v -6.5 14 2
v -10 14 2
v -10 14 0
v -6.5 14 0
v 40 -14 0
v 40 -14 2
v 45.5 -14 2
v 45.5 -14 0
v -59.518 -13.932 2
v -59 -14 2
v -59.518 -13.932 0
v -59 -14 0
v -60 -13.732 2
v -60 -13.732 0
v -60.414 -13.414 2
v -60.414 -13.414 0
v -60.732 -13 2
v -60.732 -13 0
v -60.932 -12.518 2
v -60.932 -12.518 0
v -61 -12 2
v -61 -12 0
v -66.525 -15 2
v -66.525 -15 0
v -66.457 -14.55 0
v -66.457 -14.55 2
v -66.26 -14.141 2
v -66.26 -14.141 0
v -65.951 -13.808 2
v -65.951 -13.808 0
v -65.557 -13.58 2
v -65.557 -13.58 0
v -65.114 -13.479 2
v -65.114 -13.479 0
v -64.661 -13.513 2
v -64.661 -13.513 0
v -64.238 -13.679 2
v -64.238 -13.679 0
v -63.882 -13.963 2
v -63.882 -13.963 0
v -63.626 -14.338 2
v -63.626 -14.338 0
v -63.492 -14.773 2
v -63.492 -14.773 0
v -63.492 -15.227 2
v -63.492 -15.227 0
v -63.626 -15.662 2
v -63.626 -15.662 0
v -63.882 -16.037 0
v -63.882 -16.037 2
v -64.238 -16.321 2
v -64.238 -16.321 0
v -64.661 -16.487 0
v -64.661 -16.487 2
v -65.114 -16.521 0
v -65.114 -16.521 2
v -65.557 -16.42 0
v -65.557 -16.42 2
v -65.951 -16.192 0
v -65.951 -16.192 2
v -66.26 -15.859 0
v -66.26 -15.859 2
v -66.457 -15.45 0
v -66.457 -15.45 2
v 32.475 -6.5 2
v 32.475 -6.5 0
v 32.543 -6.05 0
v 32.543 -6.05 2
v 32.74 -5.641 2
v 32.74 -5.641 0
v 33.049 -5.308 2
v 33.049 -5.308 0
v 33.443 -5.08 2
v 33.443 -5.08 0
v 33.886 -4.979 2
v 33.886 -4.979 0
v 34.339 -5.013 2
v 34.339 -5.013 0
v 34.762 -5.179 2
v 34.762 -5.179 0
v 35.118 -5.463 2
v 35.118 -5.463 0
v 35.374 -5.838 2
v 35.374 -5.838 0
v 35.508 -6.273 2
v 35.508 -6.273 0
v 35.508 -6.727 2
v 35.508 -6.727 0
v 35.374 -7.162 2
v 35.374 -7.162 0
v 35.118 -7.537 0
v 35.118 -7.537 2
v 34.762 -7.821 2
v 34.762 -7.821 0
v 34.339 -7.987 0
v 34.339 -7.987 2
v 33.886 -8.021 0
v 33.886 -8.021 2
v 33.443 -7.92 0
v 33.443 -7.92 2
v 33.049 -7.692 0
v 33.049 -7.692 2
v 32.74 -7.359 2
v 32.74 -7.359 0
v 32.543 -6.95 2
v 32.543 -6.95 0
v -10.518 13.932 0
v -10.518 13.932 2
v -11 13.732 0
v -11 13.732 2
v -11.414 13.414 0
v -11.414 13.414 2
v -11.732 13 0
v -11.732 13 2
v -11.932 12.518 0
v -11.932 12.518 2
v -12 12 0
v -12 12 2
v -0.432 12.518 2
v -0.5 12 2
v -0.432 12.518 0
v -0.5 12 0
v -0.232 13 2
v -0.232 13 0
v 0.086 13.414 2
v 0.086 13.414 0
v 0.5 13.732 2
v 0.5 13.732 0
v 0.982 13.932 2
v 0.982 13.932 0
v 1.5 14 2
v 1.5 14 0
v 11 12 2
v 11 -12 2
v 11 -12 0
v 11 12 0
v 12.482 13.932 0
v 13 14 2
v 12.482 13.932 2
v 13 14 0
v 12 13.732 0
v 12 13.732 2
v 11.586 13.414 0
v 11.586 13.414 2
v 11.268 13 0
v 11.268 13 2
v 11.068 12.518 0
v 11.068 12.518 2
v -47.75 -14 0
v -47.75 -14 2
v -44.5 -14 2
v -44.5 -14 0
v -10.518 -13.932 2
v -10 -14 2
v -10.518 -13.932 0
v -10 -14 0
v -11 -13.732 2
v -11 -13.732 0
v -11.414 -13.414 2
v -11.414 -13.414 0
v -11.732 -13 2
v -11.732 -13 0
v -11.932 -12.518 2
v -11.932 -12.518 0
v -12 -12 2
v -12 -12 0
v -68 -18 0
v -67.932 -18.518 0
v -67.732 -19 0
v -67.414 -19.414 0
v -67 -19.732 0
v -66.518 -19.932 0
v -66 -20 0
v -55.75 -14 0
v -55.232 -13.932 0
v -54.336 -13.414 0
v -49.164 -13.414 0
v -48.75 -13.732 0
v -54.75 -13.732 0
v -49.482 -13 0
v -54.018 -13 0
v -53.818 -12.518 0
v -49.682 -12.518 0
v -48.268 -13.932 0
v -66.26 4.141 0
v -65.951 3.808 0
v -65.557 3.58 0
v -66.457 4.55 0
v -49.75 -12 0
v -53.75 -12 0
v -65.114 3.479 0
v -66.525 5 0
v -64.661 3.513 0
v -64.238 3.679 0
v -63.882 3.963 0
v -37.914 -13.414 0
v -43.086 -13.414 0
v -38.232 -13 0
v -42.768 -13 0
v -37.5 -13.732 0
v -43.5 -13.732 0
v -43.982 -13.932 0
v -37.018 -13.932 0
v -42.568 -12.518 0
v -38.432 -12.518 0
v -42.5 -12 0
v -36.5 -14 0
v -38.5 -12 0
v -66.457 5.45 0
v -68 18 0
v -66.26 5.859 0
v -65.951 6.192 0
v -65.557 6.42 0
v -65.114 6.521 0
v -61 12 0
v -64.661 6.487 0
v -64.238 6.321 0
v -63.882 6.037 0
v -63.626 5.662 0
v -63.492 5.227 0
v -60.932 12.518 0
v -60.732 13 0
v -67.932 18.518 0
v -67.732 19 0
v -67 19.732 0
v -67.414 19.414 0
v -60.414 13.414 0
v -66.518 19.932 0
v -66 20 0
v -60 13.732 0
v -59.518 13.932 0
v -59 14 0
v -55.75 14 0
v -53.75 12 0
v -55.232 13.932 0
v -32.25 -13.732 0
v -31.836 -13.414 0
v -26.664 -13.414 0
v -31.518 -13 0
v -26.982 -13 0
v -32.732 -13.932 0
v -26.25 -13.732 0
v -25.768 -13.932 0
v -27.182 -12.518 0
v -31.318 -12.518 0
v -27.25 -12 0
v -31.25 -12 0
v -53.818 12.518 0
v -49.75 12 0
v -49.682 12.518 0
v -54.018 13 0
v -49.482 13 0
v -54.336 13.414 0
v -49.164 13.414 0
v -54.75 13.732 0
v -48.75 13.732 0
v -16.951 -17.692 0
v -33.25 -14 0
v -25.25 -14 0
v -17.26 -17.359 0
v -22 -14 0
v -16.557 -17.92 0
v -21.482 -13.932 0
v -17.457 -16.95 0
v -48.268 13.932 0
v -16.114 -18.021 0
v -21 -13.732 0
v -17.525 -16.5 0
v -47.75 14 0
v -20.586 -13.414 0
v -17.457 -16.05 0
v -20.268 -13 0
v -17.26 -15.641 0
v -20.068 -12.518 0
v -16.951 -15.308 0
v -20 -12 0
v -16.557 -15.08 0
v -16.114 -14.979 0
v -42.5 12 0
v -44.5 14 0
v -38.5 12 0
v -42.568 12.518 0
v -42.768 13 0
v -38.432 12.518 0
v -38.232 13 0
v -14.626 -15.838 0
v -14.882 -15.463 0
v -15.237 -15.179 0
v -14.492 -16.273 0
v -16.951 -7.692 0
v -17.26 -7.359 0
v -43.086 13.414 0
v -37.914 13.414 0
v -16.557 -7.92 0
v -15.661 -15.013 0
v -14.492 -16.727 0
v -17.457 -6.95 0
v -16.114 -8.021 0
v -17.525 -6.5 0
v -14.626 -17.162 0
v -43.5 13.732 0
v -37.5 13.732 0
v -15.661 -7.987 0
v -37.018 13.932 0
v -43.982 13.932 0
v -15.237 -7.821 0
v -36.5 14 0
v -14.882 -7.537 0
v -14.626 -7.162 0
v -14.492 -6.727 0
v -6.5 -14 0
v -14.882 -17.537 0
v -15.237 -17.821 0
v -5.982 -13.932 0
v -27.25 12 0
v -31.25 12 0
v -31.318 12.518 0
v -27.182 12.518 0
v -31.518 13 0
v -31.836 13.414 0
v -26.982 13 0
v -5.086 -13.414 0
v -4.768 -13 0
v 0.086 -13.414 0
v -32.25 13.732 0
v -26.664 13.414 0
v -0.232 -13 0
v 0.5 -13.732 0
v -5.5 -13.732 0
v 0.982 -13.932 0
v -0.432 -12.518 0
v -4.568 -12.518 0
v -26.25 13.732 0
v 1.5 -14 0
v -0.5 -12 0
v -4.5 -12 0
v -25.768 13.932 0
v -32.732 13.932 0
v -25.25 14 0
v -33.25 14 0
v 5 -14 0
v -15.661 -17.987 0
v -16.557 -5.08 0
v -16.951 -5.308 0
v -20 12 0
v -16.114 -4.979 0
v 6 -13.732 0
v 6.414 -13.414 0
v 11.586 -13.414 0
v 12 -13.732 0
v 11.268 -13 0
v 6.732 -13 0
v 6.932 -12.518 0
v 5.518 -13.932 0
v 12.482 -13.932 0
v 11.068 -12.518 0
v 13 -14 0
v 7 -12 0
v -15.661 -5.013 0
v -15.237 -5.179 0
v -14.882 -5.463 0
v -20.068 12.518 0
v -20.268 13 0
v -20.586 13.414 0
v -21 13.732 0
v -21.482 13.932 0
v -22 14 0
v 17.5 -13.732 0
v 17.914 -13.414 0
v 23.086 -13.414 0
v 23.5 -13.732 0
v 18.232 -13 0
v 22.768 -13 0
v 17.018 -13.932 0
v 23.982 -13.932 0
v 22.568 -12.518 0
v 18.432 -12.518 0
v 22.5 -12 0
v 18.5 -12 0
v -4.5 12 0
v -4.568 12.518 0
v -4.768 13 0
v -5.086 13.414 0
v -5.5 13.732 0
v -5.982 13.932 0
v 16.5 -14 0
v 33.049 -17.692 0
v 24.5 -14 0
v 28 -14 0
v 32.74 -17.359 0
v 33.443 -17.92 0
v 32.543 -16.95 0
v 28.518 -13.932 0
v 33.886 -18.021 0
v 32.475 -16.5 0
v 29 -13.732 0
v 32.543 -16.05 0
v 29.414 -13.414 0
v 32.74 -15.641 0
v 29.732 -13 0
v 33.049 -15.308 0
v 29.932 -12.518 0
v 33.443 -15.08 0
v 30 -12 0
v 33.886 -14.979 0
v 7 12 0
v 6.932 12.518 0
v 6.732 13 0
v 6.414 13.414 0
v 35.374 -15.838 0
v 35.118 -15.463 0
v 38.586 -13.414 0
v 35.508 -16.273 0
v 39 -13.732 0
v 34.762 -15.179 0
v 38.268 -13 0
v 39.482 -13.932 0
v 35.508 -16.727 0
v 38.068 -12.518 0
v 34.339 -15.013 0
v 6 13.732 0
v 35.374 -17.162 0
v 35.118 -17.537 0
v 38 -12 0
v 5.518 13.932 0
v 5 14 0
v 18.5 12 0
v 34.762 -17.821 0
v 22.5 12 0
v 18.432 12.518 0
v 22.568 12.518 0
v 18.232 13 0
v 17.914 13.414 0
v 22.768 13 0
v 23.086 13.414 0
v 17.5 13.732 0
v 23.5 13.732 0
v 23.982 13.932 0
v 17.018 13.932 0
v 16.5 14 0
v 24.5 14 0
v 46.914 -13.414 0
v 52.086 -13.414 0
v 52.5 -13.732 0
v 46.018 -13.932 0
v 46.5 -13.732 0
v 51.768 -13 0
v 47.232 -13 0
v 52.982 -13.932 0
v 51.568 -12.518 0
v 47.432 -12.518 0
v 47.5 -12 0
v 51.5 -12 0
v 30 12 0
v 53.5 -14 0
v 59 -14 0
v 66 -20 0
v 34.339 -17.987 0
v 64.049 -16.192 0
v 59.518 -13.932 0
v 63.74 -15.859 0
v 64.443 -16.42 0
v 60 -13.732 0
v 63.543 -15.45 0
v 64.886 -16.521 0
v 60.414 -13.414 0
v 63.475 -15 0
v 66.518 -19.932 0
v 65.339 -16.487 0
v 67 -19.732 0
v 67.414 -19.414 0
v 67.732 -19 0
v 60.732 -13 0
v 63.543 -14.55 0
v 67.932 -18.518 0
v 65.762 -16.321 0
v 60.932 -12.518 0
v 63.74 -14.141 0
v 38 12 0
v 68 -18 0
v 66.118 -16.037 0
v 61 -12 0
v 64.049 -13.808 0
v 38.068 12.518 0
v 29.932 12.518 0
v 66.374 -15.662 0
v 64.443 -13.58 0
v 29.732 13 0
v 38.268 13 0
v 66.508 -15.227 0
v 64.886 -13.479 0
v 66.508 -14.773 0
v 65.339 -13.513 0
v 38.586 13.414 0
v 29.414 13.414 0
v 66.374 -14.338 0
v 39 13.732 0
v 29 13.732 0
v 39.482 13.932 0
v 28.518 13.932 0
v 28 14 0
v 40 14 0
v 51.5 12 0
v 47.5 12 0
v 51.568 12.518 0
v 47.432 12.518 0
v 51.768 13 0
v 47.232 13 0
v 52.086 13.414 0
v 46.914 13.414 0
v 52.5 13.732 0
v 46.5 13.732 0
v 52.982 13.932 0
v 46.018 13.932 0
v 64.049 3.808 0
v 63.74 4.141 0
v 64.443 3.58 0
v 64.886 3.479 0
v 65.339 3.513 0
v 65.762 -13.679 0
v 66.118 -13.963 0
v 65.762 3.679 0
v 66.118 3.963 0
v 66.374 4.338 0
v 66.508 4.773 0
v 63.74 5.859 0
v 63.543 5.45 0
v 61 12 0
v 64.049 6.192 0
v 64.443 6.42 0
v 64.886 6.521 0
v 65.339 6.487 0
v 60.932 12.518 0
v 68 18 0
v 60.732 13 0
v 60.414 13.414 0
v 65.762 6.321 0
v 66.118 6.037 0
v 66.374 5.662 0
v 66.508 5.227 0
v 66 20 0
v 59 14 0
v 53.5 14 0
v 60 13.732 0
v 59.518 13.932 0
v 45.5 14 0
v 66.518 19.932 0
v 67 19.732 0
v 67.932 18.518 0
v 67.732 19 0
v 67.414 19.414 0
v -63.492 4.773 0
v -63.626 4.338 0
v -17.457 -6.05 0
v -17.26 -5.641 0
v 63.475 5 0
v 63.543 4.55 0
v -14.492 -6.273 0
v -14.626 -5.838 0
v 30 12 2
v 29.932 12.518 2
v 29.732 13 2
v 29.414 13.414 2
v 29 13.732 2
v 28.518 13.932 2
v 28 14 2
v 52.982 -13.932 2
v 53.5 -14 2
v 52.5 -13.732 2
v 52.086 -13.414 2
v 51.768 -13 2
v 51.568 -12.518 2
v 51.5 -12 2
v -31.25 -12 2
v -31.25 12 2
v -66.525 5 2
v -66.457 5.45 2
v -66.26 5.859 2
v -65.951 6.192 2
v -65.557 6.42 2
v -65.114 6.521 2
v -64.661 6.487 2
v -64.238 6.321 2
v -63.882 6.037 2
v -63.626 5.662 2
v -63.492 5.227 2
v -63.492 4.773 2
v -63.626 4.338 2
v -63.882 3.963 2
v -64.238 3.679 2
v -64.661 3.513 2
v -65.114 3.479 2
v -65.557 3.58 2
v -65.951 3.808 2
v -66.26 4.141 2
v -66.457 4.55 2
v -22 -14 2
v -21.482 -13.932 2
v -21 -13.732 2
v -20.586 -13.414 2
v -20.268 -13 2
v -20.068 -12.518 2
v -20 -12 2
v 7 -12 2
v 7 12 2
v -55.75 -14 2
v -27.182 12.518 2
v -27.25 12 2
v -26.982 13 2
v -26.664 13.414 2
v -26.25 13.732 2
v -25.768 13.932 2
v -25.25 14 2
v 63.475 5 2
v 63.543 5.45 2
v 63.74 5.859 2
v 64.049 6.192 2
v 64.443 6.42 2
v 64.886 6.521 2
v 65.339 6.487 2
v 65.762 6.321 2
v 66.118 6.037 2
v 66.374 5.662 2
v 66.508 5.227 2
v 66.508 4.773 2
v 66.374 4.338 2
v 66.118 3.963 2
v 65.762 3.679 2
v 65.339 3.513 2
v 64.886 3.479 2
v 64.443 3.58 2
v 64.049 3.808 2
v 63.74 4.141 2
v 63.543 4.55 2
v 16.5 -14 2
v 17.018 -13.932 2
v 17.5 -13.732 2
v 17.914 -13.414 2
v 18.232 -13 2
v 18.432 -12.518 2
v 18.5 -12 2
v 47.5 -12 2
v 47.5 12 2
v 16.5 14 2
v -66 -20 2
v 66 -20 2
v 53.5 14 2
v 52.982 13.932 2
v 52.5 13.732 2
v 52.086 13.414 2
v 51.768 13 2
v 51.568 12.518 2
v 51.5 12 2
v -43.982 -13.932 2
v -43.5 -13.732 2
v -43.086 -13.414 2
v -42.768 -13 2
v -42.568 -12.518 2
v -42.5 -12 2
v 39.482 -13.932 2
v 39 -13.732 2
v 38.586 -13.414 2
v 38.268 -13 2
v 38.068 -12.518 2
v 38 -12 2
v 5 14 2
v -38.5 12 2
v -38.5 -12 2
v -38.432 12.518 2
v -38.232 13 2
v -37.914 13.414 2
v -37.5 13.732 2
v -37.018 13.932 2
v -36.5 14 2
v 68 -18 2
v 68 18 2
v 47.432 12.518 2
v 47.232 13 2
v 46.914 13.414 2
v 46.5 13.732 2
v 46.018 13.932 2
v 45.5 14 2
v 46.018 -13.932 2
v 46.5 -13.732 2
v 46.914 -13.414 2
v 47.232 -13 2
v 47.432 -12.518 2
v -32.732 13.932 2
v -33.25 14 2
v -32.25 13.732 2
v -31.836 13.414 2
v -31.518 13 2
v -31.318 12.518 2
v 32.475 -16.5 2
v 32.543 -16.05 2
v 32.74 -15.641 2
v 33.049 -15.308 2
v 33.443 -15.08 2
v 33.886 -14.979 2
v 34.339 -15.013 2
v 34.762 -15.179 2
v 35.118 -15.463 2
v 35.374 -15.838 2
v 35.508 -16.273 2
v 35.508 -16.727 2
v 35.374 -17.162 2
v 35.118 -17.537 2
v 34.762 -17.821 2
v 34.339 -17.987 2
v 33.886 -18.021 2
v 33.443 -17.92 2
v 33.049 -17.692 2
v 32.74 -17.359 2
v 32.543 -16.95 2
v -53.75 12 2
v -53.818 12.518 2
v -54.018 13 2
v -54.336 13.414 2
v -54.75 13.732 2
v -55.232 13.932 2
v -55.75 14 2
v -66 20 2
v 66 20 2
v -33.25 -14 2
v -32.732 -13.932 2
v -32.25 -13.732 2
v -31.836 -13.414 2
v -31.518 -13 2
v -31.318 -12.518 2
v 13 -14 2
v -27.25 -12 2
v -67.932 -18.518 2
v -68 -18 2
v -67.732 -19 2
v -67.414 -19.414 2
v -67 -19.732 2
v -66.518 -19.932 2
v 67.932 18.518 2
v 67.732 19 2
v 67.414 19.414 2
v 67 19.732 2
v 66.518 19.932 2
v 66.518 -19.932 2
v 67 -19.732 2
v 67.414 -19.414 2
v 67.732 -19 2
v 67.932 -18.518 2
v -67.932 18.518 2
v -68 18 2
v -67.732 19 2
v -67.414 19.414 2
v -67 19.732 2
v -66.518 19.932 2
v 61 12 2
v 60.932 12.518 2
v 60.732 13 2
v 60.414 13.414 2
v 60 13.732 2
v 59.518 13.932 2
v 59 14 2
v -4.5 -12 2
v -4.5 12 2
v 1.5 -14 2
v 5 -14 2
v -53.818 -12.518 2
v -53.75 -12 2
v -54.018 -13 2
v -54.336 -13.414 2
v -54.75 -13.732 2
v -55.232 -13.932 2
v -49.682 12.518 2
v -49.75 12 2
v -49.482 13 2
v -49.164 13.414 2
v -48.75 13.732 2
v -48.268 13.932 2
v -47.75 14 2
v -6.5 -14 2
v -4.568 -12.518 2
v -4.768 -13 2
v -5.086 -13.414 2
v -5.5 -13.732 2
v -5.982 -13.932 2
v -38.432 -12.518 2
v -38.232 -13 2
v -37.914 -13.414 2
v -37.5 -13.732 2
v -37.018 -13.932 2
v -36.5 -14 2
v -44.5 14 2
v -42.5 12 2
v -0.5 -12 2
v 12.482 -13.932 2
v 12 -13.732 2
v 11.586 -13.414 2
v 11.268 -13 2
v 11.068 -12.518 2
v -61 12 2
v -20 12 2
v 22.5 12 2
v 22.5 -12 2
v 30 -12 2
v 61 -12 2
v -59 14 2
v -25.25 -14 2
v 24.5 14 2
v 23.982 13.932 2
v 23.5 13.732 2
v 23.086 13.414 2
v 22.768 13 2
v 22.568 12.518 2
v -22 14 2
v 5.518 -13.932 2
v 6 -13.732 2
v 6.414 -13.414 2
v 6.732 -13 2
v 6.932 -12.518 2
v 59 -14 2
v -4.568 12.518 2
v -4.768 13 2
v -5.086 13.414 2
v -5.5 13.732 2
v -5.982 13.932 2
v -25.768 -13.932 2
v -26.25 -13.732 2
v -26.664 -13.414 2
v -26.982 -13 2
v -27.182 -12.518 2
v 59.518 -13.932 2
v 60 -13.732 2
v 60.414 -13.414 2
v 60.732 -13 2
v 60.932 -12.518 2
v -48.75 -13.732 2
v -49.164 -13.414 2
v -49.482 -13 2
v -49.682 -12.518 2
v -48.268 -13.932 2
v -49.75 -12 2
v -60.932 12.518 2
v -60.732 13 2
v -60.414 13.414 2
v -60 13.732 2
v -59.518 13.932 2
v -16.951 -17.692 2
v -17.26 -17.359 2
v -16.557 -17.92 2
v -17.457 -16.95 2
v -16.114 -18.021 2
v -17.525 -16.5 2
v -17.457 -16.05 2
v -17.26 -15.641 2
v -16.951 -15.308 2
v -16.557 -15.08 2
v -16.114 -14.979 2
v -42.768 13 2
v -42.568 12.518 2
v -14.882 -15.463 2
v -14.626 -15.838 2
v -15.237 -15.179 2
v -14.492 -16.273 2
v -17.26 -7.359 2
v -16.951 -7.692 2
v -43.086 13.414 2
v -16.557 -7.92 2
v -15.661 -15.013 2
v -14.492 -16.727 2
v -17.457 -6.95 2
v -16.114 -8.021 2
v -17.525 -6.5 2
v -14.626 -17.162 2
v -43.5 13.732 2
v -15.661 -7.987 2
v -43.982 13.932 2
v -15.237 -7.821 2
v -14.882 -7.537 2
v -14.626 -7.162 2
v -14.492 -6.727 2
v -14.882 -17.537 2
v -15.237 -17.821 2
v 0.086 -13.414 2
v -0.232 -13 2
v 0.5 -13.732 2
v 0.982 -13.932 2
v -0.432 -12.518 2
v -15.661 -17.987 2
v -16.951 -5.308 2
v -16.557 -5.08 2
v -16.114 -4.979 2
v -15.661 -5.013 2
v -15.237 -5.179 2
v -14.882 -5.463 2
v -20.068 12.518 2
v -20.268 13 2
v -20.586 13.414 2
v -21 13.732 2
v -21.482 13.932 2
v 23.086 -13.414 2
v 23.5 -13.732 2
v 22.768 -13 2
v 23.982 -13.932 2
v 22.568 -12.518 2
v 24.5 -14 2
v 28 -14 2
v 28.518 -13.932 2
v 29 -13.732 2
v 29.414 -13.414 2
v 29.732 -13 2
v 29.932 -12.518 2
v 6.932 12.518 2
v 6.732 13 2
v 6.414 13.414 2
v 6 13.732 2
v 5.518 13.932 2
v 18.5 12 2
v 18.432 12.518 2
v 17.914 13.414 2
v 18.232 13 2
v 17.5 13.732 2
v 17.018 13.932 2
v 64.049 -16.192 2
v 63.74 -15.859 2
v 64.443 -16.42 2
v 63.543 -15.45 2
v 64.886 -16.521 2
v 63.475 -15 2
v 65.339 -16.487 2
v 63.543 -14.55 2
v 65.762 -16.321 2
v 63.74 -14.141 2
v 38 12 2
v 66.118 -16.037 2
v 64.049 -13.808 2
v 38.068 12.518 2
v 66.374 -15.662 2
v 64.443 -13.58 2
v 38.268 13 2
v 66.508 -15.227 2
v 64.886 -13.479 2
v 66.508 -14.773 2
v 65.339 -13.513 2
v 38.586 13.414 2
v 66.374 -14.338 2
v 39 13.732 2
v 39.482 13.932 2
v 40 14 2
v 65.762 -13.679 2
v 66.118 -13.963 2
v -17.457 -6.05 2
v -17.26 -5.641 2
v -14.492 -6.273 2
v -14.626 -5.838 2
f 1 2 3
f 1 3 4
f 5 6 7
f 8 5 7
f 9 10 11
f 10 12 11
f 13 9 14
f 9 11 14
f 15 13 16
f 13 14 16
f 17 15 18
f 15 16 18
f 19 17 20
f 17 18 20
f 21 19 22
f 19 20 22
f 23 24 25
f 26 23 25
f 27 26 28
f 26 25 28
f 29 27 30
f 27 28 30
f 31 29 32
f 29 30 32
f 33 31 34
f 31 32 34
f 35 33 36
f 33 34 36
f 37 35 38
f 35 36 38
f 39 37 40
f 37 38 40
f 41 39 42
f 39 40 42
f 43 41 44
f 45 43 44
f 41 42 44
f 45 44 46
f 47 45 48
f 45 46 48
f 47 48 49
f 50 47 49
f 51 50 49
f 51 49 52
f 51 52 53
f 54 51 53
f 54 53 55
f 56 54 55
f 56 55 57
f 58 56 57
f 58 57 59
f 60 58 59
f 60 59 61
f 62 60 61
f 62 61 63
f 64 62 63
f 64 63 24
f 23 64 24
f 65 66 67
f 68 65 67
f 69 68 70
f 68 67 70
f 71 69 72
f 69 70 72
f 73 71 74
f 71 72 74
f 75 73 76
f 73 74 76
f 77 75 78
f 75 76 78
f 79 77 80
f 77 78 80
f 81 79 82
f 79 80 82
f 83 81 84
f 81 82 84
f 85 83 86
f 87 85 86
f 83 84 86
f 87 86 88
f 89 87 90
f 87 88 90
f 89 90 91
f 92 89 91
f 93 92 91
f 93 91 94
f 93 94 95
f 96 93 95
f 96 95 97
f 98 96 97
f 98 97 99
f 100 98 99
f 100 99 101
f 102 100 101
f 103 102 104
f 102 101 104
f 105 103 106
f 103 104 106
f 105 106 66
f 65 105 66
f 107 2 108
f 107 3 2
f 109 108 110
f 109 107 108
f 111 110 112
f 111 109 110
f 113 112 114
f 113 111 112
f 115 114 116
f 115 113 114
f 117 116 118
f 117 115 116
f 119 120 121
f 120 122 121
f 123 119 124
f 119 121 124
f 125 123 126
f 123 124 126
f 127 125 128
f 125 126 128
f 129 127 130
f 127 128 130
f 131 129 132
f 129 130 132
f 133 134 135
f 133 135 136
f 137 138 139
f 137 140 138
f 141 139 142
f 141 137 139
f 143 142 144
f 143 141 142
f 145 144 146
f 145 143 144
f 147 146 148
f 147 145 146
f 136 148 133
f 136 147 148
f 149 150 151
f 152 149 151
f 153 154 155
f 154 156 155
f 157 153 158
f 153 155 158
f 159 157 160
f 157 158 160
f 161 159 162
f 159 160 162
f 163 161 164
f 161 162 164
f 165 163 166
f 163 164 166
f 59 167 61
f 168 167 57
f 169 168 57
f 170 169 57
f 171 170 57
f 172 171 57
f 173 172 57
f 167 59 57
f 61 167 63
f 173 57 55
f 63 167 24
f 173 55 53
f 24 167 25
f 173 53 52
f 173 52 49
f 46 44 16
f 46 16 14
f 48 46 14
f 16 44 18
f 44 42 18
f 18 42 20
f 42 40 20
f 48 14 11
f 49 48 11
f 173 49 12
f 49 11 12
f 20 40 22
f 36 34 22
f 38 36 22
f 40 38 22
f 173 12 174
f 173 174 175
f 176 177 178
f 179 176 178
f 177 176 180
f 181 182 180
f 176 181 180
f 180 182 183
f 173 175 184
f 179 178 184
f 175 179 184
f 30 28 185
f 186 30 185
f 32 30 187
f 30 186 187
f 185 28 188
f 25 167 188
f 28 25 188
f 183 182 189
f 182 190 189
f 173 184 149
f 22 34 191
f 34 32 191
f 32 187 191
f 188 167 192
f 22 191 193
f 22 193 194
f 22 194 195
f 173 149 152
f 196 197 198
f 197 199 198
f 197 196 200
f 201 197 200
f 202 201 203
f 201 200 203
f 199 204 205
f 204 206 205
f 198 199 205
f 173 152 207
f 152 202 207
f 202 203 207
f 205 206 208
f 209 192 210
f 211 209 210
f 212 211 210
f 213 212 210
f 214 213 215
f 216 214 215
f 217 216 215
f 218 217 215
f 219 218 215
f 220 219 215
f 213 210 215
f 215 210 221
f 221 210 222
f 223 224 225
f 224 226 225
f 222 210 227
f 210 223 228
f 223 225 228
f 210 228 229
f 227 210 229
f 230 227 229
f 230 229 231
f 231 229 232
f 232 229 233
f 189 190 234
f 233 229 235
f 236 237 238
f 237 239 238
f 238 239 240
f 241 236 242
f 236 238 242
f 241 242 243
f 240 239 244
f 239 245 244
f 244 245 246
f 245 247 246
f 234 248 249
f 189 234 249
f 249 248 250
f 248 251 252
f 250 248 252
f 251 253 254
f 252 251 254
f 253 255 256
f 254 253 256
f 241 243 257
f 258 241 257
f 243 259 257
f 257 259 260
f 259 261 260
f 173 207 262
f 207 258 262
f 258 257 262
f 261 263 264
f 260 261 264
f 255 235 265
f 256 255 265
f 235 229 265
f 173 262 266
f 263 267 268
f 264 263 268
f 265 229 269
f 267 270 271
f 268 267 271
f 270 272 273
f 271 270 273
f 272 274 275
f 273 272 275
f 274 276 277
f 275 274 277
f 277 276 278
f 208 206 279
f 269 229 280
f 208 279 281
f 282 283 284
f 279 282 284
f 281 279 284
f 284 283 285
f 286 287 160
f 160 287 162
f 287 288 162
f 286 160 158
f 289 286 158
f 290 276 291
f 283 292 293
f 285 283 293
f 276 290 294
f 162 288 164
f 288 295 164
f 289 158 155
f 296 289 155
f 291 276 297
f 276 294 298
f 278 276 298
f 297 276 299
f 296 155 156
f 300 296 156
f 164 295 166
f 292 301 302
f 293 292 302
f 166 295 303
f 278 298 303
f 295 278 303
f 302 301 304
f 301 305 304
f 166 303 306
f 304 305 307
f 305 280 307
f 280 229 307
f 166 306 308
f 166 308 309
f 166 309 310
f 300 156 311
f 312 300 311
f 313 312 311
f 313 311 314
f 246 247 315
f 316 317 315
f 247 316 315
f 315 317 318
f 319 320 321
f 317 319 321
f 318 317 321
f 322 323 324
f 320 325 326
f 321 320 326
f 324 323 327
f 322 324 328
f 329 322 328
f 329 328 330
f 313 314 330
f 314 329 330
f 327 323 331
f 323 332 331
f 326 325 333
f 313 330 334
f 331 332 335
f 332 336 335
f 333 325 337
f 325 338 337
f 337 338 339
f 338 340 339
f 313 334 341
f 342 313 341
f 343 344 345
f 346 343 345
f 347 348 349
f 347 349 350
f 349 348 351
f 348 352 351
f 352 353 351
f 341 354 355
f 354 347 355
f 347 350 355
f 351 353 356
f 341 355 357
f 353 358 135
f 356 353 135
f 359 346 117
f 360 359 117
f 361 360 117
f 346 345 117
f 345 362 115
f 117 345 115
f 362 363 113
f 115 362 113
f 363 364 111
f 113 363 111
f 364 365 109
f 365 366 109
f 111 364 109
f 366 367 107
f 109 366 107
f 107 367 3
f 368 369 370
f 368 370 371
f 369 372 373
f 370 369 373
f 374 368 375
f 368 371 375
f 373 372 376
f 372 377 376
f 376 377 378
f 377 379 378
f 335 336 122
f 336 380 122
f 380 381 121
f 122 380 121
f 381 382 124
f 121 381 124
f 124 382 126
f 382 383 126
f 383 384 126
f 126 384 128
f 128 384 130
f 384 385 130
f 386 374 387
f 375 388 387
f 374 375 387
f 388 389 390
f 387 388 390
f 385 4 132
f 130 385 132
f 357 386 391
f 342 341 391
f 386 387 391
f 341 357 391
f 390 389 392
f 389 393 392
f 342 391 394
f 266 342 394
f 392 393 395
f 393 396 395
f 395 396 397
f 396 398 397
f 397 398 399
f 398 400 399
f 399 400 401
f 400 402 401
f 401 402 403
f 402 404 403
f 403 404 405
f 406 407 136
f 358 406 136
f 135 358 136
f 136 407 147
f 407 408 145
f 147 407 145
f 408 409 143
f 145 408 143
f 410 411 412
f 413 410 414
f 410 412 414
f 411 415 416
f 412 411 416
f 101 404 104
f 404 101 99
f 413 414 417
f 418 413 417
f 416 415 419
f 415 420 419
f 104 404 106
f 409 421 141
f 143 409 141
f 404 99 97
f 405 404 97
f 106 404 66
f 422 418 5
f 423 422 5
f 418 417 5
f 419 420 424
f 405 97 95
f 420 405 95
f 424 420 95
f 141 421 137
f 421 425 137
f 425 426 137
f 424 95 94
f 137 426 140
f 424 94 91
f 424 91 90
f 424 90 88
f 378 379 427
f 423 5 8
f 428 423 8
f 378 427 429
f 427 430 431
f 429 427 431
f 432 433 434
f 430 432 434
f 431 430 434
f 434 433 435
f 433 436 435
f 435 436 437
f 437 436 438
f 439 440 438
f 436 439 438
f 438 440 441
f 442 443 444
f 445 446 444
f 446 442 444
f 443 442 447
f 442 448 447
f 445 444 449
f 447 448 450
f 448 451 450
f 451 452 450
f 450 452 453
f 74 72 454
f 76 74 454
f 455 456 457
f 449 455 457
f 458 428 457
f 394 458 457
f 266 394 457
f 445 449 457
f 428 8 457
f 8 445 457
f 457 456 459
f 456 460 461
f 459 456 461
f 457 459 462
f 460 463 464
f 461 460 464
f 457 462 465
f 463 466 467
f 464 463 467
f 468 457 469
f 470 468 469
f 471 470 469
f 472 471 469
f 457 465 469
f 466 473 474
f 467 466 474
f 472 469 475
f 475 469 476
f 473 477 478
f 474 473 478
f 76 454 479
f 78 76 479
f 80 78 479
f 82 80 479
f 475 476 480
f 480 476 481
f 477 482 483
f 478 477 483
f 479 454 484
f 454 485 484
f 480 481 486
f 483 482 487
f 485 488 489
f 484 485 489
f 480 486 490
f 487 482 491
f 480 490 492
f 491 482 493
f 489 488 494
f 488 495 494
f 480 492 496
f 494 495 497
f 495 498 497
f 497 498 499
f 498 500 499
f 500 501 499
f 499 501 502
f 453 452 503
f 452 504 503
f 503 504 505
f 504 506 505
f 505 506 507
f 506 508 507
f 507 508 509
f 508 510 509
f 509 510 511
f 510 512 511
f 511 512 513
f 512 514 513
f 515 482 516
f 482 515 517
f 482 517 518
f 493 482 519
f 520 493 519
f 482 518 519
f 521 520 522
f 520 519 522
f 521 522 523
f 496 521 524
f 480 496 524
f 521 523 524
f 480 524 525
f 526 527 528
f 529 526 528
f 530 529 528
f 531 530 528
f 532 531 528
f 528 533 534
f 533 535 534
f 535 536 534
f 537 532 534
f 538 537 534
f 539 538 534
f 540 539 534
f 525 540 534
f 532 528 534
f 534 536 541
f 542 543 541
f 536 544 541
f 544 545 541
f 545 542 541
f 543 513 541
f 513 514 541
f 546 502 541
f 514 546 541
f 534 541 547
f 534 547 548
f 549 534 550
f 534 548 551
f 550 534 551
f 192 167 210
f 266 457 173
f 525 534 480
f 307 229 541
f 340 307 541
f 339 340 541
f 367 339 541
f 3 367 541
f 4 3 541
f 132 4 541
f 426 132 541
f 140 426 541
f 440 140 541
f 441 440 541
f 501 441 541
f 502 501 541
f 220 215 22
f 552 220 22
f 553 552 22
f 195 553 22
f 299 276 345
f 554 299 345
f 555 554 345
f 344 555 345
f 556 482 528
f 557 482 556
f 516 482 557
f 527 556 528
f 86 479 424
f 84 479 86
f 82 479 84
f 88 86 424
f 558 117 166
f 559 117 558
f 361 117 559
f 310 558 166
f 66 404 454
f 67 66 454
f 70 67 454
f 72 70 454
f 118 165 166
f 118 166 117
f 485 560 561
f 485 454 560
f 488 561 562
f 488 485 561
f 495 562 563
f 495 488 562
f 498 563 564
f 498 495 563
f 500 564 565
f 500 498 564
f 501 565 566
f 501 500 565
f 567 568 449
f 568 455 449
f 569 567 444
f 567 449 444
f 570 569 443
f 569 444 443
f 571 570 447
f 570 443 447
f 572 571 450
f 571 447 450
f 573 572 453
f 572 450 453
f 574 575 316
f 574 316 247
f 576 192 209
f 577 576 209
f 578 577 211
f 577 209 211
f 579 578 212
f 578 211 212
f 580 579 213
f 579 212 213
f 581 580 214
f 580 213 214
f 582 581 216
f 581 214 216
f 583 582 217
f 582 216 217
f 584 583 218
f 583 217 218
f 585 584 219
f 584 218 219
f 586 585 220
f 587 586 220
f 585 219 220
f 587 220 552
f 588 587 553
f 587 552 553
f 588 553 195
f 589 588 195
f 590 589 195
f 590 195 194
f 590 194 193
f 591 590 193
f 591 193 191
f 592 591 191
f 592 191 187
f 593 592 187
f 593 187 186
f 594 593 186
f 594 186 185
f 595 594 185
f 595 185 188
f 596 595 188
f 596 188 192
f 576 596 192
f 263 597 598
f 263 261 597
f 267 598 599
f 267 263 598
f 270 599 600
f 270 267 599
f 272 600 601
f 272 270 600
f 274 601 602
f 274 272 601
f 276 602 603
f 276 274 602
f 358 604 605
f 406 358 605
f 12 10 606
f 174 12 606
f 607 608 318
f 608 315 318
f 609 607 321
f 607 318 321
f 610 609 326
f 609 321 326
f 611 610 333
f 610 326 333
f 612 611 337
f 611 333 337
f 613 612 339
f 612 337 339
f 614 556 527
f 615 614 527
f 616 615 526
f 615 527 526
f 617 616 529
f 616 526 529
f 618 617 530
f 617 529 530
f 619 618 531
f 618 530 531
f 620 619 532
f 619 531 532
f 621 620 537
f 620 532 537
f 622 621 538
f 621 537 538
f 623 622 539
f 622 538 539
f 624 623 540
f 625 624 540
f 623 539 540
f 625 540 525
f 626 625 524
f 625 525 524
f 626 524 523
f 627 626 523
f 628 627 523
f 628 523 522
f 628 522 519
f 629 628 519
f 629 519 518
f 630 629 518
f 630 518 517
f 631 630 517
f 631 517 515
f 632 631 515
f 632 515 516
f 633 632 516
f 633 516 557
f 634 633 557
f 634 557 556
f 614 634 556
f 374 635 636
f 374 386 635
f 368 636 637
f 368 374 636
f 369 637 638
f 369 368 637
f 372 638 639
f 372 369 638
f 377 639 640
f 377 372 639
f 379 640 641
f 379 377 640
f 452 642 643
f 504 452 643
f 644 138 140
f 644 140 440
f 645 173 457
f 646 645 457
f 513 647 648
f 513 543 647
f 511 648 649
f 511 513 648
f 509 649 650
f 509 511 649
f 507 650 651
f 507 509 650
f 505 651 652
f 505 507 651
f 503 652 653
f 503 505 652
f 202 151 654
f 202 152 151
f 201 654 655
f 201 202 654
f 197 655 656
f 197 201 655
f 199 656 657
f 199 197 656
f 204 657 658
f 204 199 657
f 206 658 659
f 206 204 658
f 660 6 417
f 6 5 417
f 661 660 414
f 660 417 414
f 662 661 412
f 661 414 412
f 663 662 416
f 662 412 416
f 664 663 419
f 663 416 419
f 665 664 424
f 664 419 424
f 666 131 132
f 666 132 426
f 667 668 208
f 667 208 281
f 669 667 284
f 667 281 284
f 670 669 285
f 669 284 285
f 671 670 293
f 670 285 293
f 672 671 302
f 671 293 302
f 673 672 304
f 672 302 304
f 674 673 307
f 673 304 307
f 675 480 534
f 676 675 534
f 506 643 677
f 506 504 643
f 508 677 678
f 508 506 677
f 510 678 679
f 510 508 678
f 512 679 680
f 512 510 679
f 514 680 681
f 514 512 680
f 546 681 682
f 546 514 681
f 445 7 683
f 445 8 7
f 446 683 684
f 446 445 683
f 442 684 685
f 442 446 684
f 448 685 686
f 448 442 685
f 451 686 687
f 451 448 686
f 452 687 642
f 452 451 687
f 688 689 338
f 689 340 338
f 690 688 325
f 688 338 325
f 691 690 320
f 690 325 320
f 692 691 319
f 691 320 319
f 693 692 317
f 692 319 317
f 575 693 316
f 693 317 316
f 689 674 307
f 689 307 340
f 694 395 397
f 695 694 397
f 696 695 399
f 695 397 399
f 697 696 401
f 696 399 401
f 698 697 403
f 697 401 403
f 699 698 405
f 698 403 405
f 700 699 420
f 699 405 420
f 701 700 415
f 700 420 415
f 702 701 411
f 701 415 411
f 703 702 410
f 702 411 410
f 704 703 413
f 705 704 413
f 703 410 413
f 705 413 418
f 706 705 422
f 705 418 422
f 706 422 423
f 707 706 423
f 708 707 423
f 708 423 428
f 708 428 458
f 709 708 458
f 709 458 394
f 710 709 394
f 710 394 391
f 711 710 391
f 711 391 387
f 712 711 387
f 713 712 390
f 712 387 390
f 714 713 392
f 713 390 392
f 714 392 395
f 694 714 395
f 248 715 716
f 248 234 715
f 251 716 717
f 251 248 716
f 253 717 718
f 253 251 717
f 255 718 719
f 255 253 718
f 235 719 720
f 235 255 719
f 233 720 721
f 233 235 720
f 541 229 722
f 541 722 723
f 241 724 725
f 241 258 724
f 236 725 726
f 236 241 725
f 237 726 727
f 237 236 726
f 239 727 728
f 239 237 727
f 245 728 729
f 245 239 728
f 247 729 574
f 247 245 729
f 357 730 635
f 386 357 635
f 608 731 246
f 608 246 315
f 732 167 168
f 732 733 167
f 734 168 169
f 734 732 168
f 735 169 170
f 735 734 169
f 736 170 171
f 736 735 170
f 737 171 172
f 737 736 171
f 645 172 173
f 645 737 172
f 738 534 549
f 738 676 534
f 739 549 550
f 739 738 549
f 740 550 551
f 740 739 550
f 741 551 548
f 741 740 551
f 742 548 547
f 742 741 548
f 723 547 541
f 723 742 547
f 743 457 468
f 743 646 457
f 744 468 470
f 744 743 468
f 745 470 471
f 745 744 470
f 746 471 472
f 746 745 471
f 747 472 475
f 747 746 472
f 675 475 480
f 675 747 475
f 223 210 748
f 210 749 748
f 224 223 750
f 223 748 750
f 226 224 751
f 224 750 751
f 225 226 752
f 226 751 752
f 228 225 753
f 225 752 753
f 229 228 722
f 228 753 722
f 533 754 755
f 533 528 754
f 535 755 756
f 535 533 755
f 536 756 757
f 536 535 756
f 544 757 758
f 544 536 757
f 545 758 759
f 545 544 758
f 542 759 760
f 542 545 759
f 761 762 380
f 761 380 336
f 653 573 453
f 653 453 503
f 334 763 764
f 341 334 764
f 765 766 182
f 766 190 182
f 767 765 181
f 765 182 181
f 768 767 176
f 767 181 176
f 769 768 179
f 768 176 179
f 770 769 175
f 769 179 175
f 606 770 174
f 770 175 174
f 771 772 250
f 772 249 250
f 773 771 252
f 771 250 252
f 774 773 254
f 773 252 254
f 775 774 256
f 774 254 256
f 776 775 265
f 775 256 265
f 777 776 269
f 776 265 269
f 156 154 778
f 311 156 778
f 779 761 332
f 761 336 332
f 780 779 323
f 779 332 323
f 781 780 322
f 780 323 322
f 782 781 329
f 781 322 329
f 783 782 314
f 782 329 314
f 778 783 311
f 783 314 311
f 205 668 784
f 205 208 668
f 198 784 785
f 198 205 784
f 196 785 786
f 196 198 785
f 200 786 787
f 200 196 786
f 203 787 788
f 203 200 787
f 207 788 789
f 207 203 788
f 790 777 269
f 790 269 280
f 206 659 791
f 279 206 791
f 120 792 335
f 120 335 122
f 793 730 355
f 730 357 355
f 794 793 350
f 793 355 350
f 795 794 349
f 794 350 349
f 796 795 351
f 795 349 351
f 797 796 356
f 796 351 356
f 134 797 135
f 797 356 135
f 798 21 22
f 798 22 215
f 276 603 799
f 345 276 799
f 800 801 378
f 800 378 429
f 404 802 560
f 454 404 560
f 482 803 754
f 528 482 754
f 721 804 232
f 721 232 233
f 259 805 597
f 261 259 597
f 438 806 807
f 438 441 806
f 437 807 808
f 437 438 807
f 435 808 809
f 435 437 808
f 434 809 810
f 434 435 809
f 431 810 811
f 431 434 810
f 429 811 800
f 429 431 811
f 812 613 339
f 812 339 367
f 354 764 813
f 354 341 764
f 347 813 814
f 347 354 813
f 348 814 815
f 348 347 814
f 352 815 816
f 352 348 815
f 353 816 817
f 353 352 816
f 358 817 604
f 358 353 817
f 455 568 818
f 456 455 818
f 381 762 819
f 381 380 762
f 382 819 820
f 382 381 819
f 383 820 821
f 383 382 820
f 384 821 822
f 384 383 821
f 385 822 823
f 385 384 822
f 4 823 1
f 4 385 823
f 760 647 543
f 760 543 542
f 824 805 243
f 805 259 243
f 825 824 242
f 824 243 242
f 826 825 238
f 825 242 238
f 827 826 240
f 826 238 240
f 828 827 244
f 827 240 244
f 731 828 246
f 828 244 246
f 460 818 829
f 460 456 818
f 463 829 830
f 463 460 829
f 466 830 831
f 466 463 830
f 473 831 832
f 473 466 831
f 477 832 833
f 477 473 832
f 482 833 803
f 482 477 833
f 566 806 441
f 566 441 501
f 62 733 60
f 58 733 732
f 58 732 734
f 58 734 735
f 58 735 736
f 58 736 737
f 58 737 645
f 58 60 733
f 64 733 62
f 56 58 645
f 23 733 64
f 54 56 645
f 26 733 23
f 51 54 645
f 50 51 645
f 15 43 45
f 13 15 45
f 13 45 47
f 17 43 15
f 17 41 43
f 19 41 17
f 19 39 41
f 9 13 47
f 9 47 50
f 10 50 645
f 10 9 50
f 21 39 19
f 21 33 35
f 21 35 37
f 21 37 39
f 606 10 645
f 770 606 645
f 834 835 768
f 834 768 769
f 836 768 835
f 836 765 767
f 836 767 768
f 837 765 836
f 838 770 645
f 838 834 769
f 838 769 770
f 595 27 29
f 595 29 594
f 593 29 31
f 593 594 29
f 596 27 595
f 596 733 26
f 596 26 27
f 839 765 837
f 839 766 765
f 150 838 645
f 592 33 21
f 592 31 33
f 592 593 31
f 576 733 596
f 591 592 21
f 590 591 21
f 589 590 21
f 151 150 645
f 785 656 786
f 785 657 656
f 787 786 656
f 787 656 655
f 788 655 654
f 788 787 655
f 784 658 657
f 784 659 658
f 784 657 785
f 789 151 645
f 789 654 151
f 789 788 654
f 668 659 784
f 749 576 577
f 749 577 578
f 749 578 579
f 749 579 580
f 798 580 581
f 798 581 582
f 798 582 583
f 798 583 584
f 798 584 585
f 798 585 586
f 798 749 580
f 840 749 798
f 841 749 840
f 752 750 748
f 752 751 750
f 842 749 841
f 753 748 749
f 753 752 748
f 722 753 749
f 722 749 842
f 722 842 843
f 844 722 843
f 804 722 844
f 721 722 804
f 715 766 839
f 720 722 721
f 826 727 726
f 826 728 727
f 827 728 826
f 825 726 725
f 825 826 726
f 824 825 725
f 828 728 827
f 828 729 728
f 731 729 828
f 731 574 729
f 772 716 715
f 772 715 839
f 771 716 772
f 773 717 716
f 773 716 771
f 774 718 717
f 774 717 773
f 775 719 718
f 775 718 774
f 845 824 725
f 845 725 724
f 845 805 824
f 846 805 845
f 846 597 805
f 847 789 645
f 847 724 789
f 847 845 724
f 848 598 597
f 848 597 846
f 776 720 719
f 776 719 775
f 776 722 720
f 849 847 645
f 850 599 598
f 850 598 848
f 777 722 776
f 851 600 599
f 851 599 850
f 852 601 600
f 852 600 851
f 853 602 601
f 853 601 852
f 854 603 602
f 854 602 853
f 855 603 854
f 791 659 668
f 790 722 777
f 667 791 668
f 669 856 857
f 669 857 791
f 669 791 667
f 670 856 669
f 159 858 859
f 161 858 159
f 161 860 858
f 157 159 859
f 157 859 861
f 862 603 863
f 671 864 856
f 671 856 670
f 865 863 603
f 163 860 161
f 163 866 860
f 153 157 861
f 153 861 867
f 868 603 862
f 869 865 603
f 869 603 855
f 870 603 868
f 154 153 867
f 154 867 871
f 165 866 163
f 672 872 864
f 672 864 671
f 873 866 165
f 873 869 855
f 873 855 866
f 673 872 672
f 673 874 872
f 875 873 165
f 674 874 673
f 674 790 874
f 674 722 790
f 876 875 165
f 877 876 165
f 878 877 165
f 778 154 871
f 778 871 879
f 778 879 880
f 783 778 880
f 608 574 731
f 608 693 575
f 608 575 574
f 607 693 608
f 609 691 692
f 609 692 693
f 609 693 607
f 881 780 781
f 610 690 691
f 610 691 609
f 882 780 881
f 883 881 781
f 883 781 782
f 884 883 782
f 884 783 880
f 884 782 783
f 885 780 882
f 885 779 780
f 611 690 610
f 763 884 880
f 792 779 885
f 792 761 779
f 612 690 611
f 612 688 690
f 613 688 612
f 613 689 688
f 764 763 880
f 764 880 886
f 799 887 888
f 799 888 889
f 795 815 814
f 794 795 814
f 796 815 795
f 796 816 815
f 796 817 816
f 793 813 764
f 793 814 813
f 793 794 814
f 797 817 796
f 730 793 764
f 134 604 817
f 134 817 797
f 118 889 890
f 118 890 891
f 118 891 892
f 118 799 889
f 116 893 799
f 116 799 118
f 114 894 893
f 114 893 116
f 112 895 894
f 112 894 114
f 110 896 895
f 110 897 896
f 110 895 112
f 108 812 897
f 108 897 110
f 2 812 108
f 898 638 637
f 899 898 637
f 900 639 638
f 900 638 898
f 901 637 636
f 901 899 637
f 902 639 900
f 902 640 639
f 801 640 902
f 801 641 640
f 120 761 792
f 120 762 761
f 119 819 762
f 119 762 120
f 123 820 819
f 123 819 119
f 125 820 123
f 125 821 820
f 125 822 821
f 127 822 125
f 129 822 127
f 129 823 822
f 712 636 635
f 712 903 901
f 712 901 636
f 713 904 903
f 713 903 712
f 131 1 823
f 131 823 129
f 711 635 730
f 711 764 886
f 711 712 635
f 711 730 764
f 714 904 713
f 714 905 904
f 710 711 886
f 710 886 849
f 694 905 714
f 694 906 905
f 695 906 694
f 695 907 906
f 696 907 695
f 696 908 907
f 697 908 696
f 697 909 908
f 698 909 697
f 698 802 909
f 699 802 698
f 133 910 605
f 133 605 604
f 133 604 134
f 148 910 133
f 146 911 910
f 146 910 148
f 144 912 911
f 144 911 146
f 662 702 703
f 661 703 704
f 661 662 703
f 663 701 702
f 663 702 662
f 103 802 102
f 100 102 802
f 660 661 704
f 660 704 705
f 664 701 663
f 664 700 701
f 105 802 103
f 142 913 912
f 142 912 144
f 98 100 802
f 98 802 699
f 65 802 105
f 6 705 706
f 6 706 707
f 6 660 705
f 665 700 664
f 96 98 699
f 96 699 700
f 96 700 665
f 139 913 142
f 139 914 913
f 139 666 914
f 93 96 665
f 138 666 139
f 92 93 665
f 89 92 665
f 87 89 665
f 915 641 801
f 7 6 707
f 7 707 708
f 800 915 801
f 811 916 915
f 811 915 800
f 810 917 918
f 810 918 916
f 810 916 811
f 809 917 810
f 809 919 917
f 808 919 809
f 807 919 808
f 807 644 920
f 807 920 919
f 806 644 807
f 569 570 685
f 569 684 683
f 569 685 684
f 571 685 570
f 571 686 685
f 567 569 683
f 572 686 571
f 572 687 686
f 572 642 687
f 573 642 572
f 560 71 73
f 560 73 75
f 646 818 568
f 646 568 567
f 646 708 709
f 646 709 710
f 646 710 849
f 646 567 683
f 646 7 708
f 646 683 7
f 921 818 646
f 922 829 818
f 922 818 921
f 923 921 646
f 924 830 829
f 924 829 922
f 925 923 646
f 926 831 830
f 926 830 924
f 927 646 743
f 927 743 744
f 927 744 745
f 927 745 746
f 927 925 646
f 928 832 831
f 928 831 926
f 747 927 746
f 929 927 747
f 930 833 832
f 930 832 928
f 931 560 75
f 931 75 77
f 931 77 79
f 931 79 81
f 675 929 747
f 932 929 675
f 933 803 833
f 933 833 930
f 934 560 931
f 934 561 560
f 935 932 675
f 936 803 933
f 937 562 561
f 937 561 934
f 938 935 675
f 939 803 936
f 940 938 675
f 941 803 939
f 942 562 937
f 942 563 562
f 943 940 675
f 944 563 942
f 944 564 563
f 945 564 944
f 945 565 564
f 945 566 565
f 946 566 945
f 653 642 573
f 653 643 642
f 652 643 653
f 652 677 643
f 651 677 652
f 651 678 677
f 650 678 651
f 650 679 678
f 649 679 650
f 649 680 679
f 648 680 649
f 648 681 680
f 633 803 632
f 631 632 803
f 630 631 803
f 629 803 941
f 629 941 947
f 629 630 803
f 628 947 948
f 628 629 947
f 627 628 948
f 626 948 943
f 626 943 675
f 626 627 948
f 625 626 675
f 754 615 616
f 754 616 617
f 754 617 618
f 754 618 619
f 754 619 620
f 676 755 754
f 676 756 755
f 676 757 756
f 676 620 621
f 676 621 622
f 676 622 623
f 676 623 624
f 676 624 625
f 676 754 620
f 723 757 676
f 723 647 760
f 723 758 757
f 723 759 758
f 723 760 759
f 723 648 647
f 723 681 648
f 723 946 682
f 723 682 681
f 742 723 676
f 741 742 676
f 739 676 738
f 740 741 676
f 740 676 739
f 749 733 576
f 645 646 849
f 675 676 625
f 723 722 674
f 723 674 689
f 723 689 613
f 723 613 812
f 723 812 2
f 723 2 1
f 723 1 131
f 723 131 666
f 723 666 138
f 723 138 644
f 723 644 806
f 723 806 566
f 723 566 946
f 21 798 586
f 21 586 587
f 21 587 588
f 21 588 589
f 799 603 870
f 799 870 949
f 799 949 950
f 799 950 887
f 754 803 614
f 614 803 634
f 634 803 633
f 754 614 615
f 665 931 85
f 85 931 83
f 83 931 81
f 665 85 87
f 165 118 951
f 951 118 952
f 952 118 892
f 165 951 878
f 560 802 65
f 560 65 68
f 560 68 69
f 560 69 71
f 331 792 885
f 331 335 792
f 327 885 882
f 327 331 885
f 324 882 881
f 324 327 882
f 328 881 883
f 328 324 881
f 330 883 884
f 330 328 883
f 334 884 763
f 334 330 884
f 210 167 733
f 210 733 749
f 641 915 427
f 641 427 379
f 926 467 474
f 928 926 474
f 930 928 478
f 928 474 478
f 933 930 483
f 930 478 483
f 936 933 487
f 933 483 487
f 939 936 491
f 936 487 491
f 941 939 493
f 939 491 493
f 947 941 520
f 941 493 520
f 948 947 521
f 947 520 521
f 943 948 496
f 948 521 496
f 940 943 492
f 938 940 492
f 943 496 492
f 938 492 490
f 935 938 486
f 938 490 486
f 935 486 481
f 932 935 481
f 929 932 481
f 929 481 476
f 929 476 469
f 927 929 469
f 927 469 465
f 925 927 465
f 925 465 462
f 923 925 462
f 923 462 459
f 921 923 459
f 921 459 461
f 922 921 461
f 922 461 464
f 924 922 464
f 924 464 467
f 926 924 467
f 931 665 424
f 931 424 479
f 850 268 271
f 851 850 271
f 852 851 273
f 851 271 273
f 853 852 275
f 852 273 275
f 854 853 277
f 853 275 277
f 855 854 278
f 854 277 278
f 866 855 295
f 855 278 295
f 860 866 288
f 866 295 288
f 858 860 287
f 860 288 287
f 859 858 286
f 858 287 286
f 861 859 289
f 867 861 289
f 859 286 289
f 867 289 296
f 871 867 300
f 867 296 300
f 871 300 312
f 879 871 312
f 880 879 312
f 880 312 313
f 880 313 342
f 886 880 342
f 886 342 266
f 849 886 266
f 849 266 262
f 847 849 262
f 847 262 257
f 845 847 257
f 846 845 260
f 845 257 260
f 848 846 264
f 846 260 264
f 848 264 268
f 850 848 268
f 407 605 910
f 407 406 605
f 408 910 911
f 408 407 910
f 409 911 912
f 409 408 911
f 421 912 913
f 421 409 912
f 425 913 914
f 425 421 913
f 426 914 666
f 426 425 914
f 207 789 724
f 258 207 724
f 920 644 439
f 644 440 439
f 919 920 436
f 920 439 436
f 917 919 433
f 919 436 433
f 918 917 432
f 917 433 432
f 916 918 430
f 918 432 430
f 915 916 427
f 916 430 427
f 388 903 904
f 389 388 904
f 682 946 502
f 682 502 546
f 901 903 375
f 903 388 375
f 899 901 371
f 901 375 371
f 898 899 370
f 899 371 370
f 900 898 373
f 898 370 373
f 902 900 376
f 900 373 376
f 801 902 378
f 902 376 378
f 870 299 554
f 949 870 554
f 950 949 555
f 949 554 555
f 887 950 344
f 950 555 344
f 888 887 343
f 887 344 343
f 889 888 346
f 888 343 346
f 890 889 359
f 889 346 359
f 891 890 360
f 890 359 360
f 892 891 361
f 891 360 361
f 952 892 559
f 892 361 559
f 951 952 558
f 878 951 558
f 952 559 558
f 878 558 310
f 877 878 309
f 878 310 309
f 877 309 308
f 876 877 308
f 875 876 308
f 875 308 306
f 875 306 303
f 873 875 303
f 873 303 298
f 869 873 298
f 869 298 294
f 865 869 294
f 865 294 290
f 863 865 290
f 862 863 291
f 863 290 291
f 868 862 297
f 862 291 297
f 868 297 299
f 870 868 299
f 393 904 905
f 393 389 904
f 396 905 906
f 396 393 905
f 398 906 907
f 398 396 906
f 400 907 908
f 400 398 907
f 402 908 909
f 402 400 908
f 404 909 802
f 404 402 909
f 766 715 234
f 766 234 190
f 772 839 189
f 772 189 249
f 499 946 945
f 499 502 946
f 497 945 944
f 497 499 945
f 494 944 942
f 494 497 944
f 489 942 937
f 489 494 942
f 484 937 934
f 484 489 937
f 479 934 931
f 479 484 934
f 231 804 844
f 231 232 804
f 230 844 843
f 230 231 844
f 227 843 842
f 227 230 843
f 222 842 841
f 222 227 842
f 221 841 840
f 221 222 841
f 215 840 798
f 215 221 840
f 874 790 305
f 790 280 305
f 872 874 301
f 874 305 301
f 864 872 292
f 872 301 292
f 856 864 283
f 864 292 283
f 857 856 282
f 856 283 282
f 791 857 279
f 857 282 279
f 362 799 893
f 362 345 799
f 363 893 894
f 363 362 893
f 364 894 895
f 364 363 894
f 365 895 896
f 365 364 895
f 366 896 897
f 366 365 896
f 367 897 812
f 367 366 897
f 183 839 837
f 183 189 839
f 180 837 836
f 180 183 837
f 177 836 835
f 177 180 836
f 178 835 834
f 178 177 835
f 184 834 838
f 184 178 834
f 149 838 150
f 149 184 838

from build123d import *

# Parameters (mm, degrees)
SKETCH_1_W          = 136
SKETCH_1_H          = 40
EXTRUDE_1_DEPTH     = 2
SKETCH_2_R          = 1.525
CUT_EXTRUDE_1_DEPTH = 2
SKETCH_3_R          = 1.525
CUT_EXTRUDE_2_DEPTH = 22
SKETCH_4_W          = 18.5
SKETCH_4_H          = 28
CUT_EXTRUDE_3_DEPTH = 22
EXTRUDE_2_DEPTH     = 2
SKETCH_6_W          = 9.5
SKETCH_6_H          = 28
CUT_EXTRUDE_4_DEPTH = 2
FILLET_1_R          = 2
SKETCH_7_W          = 19
SKETCH_7_H          = 28
CUT_EXTRUDE_5_DEPTH = 2
EXTRUDE_3_DEPTH     = 2
FILLET_2_R          = 2
FILLET_3_R          = 2


with BuildPart() as part:
    # 草图1 → 凸台-拉伸1 (new body)
    with BuildSketch(Plane.XY):
        Rectangle(SKETCH_1_W, SKETCH_1_H)
    extrude(amount=EXTRUDE_1_DEPTH)

    # 草图2 → 切除-拉伸1 (cut)
    with BuildSketch(Plane(origin=(0, 0, 0), x_dir=(-1, 0, 0), z_dir=(0, 0, -1))):
        with Locations((-34, -6.5)):
            Circle(SKETCH_2_R)
        with Locations((-34, -16.5)):
            Circle(SKETCH_2_R)
        with Locations((16, -6.5)):
            Circle(SKETCH_2_R)
        with Locations((16, -16.5)):
            Circle(SKETCH_2_R)
    extrude(amount=-CUT_EXTRUDE_1_DEPTH, mode=Mode.SUBTRACT)

    # 草图3 → 切除-拉伸2 (cut)
    with BuildSketch(Plane(origin=(0, 0, 0), x_dir=(-1, 0, 0), z_dir=(0, 0, -1))):
        with Locations((65, -15)):
            Circle(SKETCH_3_R)
        with Locations((65, 5)):
            Circle(SKETCH_3_R)
        with Locations((-65, 5)):
            Circle(SKETCH_3_R)
        with Locations((-65, -15)):
            Circle(SKETCH_3_R)
    extrude(amount=-CUT_EXTRUDE_2_DEPTH, mode=Mode.SUBTRACT)

    # 草图4 → 切除-拉伸3 (cut)
    with BuildSketch(Plane.XY.offset(2)):
        with Locations((-51.75, 0)):
            Rectangle(SKETCH_4_W, SKETCH_4_H)
        with Locations((-29.25, 0)):
            Rectangle(SKETCH_4_W, SKETCH_4_H)
    extrude(amount=-CUT_EXTRUDE_3_DEPTH, mode=Mode.SUBTRACT)

    # 草图5 → 凸台-拉伸2 (add)
    with BuildSketch(Plane.XY.offset(2)):
        with BuildLine():
            Line((-53.75, 14), (-53.75, -14))
            ThreePointArc((-53.75, -14), (-51.75, -16), (-49.75, -14))
            Line((-49.75, -14), (-49.75, 14))
            ThreePointArc((-49.75, 14), (-51.75, 16), (-53.75, 14))
        make_face()
        with BuildLine():
            Line((-31.25, 14), (-31.25, -14))
            ThreePointArc((-31.25, -14), (-29.25, -16), (-27.25, -14))
            Line((-27.25, -14), (-27.25, 14))
            ThreePointArc((-27.25, 14), (-29.25, 16), (-31.25, 14))
        make_face()
    extrude(amount=-EXTRUDE_2_DEPTH)

    # 草图6 → 切除-拉伸4 (cut)
    with BuildSketch(Plane.XY.offset(2)):
        with Locations((42.75, 0)):
            Rectangle(SKETCH_6_W, SKETCH_6_H)
        with Locations((56.25, 0)):
            Rectangle(SKETCH_6_W, SKETCH_6_H)
    extrude(amount=-CUT_EXTRUDE_4_DEPTH, mode=Mode.SUBTRACT)

    # 圆角1
    fillet_1_edges = [part.edges().sort_by_distance(p)[0] for p in [
        (-53.75, -14, 1),
        (-49.75, -14, 1),
        (-49.75, 14, 1),
        (-53.75, 14, 1),
        (-31.25, -14, 1),
        (-27.25, -14, 1),
        (-27.25, 14, 1),
        (-31.25, 14, 1),
        (47.5, 14, 1),
        (47.5, -14, 1),
        (38, -14, 1),
        (38, 14, 1),
        (51.5, -14, 1),
        (61, -14, 1),
        (61, 14, 1),
        (51.5, 14, 1),
        (-42.5, 14, 1),
        (-42.5, -14, 1),
        (-61, -14, 1),
        (-61, 14, 1),
        (-38.5, 14, 1),
        (-20, 14, 1),
        (-20, -14, 1),
        (-38.5, -14, 1),
    ]]
    fillet(fillet_1_edges, radius=FILLET_1_R)

    # 草图7 → 切除-拉伸5 (cut)
    with BuildSketch(Plane.XY.offset(2)):
        with Locations((-2.5, 0)):
            Rectangle(SKETCH_7_W, SKETCH_7_H)
        with Locations((20.5, 0)):
            Rectangle(SKETCH_7_W, SKETCH_7_H)
    extrude(amount=-CUT_EXTRUDE_5_DEPTH, mode=Mode.SUBTRACT)

    # 草图8 → 凸台-拉伸3 (add)
    with BuildSketch(Plane.XY.offset(2)):
        with BuildLine():
            Line((-4.5, 14), (-4.5, -14))
            ThreePointArc((-4.5, -14), (-2.5, -16), (-0.5, -14))
            Line((-0.5, -14), (-0.5, 14))
            ThreePointArc((-0.5, 14), (-2.5, 16), (-4.5, 14))
        make_face()
        with BuildLine():
            Line((18.5, 14), (18.5, -14))
            ThreePointArc((18.5, -14), (20.5, -16), (22.5, -14))
            Line((22.5, -14), (22.5, 14))
            ThreePointArc((22.5, 14), (20.5, 16), (18.5, 14))
        make_face()
    extrude(amount=-EXTRUDE_3_DEPTH)

    # 圆角2
    fillet_2_edges = [part.edges().sort_by_distance(p)[0] for p in [
        (7, 14, 1),
        (7, -14, 1),
        (-12, -14, 1),
        (-12, 14, 1),
        (11, -14, 1),
        (30, -14, 1),
        (30, 14, 1),
        (11, 14, 1),
        (-4.5, -14, 1),
        (-0.5, -14, 1),
        (-0.5, 14, 1),
        (-4.5, 14, 1),
        (18.5, -14, 1),
        (22.5, -14, 1),
        (22.5, 14, 1),
        (18.5, 14, 1),
    ]]
    fillet(fillet_2_edges, radius=FILLET_2_R)

    # 圆角3
    fillet_3_edges = [part.edges().sort_by_distance(p)[0] for p in [
        (68, -20, 1),
        (-68, -20, 1),
        (-68, 20, 1),
        (68, 20, 1),
    ]]
    fillet(fillet_3_edges, radius=FILLET_3_R)


solid = part.part
